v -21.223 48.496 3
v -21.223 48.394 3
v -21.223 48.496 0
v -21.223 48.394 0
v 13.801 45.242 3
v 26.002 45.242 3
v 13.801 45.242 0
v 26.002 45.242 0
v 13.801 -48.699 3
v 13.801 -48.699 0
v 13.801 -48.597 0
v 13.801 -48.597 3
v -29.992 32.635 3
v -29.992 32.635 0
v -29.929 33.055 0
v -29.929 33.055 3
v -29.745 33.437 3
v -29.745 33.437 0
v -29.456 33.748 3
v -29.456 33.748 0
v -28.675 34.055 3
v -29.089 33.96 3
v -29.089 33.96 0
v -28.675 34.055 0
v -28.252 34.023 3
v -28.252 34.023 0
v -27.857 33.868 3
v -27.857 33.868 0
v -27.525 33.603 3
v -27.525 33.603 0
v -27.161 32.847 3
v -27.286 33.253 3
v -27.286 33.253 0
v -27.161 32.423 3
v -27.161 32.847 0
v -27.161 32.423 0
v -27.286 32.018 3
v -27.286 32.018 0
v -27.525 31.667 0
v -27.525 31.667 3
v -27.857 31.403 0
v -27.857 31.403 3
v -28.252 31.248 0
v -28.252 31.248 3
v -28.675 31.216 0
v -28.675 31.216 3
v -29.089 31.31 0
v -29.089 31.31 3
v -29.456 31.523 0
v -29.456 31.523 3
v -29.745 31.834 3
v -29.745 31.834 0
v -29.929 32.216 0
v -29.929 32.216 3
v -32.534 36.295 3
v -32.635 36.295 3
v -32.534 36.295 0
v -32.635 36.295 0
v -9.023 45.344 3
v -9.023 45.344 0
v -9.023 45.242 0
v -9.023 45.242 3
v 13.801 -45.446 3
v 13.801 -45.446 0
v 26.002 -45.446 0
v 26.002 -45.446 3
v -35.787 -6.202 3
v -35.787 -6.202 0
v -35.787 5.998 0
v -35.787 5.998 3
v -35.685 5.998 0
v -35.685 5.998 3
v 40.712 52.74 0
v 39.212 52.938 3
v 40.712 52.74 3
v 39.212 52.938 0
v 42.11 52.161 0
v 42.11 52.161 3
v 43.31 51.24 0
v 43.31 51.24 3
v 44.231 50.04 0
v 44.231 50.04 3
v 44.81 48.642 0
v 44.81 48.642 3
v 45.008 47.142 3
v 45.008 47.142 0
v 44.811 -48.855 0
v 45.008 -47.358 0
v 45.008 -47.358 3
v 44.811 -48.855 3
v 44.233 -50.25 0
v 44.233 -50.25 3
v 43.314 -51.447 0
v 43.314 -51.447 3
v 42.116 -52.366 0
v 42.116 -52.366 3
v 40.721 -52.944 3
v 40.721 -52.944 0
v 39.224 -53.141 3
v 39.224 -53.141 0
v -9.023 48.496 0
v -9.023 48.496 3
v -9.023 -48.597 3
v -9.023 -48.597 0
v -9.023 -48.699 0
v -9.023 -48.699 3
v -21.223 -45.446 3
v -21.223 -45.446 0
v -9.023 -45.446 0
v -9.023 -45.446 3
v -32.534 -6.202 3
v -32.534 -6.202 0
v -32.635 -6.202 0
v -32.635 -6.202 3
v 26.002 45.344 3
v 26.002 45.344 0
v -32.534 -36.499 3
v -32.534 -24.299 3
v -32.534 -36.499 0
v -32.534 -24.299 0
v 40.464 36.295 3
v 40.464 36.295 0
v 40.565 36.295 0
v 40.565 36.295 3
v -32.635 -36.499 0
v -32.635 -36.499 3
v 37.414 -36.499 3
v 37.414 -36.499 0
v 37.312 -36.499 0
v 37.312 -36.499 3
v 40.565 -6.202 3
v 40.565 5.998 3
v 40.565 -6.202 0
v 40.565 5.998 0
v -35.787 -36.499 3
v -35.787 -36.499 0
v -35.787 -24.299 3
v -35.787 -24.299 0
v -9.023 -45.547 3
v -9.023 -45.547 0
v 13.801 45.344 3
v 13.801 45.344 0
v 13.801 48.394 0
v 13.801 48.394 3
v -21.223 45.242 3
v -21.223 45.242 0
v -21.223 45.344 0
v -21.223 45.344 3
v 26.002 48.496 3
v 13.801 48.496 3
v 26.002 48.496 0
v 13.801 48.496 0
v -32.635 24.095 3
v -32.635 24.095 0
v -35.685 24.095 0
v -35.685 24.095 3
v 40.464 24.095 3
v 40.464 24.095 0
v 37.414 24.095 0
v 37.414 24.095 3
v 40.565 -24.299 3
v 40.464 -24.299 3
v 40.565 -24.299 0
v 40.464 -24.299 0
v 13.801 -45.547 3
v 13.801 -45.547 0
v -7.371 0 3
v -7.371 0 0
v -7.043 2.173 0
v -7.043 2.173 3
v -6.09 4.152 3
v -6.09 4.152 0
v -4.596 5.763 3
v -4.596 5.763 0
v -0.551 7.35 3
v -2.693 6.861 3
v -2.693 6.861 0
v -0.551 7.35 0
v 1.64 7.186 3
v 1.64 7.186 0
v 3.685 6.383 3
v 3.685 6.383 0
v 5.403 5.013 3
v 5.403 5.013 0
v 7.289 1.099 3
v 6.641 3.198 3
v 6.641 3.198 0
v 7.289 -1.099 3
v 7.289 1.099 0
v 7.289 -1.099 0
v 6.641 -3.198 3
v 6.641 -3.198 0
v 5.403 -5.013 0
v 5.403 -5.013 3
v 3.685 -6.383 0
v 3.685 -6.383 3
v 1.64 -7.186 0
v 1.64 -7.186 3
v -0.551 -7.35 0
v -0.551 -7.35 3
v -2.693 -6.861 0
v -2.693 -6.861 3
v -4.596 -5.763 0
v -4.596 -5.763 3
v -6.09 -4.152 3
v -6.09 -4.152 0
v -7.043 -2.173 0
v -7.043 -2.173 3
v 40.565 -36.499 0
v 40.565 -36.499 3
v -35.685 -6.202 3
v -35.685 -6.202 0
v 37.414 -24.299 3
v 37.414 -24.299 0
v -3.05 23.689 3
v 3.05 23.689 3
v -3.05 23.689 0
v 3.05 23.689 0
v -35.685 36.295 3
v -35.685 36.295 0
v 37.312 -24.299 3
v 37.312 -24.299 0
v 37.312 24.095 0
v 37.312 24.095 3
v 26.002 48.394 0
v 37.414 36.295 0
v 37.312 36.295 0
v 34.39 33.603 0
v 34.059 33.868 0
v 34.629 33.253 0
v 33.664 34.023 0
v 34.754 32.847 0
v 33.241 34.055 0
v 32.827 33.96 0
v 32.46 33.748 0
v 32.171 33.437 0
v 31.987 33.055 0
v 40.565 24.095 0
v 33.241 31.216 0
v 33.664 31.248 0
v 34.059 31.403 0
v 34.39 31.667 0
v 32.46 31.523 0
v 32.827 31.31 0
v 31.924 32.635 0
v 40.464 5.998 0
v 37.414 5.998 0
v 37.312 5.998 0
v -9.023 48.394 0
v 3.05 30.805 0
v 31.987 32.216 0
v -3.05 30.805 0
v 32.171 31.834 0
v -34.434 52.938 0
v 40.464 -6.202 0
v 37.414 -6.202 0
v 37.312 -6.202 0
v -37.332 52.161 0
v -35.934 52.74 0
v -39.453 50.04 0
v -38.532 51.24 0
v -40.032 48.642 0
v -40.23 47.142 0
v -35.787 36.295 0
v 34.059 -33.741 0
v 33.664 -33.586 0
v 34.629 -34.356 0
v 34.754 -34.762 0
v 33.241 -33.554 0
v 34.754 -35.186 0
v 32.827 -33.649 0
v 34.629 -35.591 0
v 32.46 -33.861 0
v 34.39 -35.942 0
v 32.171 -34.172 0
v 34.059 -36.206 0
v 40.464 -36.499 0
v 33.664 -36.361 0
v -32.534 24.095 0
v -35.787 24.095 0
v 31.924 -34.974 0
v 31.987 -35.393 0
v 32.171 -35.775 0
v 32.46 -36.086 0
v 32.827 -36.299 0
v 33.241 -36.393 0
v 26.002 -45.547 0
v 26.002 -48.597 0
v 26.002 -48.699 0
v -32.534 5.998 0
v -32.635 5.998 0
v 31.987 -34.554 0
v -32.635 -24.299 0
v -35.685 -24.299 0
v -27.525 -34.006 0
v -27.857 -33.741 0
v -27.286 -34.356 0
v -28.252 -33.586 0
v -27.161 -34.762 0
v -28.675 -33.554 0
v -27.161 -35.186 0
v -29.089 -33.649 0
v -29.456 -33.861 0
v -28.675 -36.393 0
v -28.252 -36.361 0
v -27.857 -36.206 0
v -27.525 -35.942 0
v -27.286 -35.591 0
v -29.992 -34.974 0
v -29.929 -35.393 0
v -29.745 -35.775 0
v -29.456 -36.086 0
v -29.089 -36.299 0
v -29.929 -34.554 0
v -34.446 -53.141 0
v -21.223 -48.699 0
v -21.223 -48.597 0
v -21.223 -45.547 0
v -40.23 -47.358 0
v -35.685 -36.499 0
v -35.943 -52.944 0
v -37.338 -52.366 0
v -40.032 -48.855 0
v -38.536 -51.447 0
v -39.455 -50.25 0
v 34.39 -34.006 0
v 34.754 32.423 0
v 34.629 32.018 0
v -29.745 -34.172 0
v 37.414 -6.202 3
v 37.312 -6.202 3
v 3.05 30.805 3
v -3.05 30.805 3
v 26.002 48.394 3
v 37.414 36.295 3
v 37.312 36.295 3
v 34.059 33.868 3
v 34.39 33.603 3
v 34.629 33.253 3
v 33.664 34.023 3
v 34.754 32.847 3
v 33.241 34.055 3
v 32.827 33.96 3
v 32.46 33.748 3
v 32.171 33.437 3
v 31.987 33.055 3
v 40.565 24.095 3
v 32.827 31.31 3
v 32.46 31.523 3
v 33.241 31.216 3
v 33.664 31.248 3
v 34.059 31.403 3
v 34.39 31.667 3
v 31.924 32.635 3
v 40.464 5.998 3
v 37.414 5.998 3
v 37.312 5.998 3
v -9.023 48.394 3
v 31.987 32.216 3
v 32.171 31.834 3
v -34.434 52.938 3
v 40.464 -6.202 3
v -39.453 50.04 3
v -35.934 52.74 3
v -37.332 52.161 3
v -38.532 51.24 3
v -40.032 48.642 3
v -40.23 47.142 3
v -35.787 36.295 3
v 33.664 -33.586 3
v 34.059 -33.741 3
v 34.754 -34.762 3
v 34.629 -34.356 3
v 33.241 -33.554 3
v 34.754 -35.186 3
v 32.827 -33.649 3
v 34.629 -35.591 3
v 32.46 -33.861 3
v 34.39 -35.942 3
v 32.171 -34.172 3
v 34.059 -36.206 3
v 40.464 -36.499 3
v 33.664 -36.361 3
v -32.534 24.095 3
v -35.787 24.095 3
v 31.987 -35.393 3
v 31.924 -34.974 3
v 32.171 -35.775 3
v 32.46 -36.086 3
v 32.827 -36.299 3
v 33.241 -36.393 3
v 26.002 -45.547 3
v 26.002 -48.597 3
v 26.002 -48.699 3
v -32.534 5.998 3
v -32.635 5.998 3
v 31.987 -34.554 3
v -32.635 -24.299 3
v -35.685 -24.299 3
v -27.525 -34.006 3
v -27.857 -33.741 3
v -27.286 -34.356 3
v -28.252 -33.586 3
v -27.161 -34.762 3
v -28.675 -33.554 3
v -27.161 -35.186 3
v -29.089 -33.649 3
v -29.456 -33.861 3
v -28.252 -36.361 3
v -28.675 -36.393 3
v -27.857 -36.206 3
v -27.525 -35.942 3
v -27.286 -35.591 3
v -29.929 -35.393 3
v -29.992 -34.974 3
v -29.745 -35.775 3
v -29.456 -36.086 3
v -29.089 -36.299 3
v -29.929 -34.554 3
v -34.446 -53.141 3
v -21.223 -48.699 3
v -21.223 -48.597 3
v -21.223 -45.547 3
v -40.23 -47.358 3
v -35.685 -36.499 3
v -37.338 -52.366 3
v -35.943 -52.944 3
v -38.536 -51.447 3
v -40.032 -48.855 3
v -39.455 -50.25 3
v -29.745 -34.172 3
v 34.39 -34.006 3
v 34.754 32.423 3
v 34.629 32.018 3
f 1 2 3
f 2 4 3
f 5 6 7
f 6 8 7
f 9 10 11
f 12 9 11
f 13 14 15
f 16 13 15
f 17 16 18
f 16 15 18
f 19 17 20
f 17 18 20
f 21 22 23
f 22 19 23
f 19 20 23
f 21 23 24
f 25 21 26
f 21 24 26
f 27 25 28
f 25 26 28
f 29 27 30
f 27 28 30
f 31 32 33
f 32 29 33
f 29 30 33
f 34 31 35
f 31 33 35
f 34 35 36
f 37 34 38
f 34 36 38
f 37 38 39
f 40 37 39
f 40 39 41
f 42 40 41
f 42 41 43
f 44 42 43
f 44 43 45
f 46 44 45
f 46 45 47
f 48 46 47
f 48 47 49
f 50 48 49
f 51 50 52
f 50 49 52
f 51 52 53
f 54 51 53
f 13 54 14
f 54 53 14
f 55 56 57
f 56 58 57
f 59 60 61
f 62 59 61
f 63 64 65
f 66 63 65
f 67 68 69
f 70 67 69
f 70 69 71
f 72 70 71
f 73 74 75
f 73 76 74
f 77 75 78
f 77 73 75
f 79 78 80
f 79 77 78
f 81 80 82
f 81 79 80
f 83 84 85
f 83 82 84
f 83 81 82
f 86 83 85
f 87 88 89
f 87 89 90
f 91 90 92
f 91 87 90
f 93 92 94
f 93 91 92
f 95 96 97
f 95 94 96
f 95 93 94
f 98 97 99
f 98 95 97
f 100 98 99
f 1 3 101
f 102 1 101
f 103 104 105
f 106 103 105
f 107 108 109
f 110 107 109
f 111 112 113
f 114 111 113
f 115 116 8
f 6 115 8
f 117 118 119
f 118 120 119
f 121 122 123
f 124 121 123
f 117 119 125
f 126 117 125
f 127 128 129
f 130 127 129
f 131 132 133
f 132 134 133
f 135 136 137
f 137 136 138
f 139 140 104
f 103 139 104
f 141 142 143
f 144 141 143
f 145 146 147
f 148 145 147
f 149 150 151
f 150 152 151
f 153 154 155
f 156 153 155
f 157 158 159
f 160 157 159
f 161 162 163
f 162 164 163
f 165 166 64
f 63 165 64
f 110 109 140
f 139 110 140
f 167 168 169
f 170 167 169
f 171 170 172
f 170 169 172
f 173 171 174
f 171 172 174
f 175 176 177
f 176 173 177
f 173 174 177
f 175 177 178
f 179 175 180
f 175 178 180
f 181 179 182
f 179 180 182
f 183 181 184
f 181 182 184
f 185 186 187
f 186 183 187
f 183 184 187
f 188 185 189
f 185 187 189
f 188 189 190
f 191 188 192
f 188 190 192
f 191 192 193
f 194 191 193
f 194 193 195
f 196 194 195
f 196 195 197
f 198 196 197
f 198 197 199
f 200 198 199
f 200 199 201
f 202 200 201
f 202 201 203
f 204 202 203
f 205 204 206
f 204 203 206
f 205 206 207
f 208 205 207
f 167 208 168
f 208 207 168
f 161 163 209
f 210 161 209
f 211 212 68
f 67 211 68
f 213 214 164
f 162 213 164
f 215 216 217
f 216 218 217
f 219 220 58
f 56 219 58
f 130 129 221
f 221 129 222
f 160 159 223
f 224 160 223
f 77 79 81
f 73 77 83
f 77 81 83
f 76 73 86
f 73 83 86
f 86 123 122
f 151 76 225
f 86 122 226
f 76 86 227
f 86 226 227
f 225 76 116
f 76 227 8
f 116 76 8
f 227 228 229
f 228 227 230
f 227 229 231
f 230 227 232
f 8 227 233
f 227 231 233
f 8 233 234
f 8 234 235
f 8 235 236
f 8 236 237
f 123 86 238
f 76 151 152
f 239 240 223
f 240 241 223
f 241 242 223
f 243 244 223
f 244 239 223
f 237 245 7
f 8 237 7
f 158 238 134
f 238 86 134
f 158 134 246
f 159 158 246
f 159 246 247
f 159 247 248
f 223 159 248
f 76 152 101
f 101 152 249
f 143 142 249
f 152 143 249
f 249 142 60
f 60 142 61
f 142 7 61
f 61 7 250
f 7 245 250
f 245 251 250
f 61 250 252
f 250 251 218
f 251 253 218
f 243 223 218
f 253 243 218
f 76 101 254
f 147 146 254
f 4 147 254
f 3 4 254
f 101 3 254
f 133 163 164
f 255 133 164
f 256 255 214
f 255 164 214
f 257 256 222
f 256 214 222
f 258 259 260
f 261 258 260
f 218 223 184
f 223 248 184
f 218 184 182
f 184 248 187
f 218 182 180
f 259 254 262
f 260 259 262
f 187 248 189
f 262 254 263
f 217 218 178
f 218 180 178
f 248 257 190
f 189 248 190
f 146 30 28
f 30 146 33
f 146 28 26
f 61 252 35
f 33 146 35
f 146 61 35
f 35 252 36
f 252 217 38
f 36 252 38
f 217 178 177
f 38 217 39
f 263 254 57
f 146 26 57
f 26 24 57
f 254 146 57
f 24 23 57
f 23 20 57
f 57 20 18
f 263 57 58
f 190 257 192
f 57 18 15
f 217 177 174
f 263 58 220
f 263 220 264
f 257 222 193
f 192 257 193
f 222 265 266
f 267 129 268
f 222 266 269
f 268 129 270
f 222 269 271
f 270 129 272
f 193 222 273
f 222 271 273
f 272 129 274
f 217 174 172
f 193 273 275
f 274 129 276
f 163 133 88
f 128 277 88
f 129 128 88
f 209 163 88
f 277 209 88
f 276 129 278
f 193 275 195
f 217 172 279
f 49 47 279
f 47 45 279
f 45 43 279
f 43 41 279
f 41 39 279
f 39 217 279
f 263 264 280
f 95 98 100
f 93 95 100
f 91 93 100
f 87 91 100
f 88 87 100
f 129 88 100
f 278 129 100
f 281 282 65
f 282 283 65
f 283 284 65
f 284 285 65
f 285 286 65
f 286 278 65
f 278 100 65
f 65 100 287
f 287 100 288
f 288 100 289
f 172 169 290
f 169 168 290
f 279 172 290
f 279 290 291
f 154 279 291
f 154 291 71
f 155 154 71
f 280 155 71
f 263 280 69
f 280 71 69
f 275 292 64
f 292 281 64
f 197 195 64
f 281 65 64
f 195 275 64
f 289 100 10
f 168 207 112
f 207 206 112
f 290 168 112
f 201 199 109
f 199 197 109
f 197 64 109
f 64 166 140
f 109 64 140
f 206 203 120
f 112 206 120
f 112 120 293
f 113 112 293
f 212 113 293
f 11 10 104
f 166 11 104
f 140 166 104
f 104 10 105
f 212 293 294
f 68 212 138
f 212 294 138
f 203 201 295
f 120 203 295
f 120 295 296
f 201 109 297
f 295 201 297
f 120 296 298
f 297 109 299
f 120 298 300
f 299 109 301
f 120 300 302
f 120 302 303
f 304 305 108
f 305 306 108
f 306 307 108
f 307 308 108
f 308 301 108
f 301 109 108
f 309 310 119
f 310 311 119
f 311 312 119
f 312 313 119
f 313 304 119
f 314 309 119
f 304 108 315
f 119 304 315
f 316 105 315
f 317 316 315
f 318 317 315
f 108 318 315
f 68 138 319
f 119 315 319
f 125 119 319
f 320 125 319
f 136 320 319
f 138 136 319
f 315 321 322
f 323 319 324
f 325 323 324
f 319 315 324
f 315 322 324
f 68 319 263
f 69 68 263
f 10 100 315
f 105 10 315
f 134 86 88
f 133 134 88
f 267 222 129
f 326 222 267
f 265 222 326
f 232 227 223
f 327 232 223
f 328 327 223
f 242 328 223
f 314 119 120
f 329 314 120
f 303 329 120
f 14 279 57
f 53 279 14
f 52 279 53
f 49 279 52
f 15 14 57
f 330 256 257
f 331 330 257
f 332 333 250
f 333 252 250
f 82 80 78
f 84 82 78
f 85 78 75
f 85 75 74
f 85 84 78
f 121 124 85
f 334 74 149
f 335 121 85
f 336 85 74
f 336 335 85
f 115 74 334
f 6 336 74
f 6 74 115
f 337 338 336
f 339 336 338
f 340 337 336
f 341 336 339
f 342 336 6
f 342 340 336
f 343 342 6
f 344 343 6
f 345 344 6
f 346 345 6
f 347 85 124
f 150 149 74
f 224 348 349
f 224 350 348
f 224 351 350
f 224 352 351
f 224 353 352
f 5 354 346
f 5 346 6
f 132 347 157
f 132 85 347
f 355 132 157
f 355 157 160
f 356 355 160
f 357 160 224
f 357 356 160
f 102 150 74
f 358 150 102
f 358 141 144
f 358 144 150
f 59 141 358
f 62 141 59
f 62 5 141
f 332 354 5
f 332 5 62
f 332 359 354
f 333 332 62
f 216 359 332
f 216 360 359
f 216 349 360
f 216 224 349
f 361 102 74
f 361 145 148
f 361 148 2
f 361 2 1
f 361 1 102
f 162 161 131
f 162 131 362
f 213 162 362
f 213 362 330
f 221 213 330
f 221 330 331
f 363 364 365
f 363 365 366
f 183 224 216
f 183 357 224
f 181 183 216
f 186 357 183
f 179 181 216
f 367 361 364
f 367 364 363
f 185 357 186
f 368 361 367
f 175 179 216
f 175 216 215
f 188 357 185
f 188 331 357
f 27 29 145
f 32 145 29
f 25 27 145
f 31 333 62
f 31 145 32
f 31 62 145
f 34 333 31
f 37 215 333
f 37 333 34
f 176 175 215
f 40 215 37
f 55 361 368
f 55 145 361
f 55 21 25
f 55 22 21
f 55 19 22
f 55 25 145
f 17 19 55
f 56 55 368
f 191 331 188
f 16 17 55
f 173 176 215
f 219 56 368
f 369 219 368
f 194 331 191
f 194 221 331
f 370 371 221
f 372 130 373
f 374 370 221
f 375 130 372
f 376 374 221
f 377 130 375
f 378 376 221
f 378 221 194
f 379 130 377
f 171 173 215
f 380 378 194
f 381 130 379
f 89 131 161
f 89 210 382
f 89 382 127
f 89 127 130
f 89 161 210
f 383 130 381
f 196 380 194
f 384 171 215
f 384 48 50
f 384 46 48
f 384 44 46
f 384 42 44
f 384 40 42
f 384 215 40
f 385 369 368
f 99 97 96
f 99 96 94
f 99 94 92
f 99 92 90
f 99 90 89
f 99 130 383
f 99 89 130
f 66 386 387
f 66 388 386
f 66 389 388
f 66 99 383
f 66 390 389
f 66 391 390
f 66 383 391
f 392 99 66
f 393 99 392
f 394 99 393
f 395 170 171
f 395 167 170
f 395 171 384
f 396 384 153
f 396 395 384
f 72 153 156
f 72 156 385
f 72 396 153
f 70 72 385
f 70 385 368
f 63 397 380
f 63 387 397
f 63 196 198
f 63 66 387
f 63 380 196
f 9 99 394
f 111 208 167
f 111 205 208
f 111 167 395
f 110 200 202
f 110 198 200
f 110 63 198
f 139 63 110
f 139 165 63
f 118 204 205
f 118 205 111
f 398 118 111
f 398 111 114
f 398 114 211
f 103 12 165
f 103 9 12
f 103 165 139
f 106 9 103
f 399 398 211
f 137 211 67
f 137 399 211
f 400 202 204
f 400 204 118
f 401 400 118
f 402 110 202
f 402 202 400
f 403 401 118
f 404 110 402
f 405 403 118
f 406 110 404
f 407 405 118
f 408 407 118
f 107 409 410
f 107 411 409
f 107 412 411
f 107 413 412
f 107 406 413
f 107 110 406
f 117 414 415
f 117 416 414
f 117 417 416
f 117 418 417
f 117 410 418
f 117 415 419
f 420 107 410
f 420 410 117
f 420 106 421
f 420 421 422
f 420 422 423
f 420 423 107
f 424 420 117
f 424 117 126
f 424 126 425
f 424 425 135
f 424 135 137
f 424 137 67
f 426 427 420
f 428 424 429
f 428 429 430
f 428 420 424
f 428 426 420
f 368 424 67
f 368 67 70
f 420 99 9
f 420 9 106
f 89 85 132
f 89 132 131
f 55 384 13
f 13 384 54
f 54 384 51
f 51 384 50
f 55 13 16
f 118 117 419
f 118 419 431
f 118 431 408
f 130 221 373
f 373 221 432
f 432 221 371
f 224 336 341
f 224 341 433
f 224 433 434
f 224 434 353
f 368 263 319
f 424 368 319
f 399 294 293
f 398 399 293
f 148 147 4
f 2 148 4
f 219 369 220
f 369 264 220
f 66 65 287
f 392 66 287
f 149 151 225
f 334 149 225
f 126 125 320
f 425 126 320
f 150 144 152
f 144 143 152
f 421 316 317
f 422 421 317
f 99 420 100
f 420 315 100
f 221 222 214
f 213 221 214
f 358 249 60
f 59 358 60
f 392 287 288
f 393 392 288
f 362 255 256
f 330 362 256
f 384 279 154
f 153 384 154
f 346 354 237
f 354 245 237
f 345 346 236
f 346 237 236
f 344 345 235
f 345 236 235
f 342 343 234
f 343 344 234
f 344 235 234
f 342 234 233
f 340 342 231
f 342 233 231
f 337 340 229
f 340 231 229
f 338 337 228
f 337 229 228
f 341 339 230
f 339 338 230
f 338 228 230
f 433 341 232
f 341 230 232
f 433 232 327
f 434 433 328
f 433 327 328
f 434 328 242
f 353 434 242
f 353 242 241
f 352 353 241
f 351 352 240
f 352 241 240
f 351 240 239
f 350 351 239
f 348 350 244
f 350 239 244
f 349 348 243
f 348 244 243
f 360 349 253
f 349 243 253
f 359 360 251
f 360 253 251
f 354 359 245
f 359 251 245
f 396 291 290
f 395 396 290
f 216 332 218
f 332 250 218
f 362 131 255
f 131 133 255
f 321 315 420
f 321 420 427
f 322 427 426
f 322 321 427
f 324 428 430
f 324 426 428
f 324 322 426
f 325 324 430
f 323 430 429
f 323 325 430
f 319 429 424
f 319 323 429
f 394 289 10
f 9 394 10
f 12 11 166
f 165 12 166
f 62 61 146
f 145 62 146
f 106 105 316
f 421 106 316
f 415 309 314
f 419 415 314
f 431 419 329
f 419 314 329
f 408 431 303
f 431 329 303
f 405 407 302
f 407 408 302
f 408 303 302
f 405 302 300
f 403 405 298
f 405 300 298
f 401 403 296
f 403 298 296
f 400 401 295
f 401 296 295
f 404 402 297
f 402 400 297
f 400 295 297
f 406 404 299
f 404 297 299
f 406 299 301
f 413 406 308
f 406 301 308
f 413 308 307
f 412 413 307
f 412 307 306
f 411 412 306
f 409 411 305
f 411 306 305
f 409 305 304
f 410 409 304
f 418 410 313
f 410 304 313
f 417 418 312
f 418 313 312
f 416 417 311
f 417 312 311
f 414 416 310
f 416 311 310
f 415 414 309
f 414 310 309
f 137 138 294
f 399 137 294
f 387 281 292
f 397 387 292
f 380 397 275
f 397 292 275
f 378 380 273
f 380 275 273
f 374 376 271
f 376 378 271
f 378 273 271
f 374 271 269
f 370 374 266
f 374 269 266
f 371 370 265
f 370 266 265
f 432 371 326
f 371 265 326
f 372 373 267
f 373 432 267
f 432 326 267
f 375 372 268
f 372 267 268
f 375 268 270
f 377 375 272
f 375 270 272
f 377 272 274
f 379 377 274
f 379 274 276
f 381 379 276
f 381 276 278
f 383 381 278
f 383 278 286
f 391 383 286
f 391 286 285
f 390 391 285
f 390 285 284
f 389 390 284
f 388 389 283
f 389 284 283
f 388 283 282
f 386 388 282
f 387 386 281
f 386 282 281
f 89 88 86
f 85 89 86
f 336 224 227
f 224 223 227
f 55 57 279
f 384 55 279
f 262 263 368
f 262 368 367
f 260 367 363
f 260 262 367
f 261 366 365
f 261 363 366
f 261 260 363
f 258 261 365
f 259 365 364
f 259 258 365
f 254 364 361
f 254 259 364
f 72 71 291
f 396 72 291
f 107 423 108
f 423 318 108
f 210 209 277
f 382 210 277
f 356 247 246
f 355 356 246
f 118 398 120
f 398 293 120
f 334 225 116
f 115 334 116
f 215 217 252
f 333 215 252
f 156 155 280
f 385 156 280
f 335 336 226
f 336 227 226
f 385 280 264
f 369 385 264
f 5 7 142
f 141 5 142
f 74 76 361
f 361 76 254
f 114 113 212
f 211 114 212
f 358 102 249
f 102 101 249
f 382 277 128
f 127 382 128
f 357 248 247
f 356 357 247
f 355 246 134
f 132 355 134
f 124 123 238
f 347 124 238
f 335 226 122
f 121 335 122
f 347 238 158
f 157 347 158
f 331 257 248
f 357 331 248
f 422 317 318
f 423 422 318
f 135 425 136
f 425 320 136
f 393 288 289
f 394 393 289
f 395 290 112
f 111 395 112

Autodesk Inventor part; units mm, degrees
ref_plane "YZ Plane" through (0, 0, 0) normal (1, 0, 0) x (0, 1, 0)
ref_plane "XZ Plane" through (0, 0, 0) normal (0, 1, 0) x (-1, 0, 0)
ref_plane "XY Plane" through (0, 0, 0) normal (0, 0, 1) x (1, 0, 0)
sketch "Boceto1" plane through (0, 0, 0) normal (0, 0, 1) x (-1, 0, 0)
  line L0 (-40.5654, -5.9984) -> (-40.5654, 6.2017)
  line L1 (-40.5654, 6.2017) -> (-40.4637, 6.2017)
  line L2 (-40.4637, 6.2017) -> (-37.4137, 6.2017)
  line L3 (-37.4137, 6.2017) -> (-37.312, 6.2017)
  line L4 (-37.312, 6.2017) -> (-37.312, -5.9984)
  line L5 (-37.312, -5.9984) -> (-37.4137, -5.9984)
  line L6 (-37.4137, -5.9984) -> (-40.4637, -5.9984)
  line L7 (-40.4637, -5.9984) -> (-40.5654, -5.9984)
  line L8 (35.787, -5.9984) -> (35.6854, -5.9984)
  line L9 (35.6854, -5.9984) -> (32.6353, -5.9984)
  line L10 (32.6353, -5.9984) -> (32.5337, -5.9984)
  line L11 (32.5337, -5.9984) -> (32.5337, 6.2017)
  line L12 (32.5337, 6.2017) -> (32.6353, 6.2017)
  line L13 (32.6353, 6.2017) -> (35.6854, 6.2017)
  line L14 (35.6854, 6.2017) -> (35.787, 6.2017)
  line L15 (35.787, 6.2017) -> (35.787, -5.9984)
  line L16 (35.6854, 36.4987) -> (35.787, 36.4987)
  line L17 (35.787, 36.4987) -> (35.787, 24.2986)
  line L18 (35.787, 24.2986) -> (35.6854, 24.2986)
  line L19 (35.6854, 24.2986) -> (32.6353, 24.2986)
  line L20 (32.6353, 24.2986) -> (32.5337, 24.2986)
  line L21 (32.5337, 24.2986) -> (32.5337, 36.4987)
  line L22 (32.5337, 36.4987) -> (32.6353, 36.4987)
  line L23 (32.6353, 36.4987) -> (35.6854, 36.4987)
  line L24 (-26.0015, -48.4955) -> (-26.0015, -48.3938)
  line L25 (-26.0015, -48.3938) -> (-26.0015, -45.3438)
  line L26 (-26.0015, -45.3438) -> (-26.0015, -45.2421)
  line L27 (-26.0015, -45.2421) -> (-13.8014, -45.2421)
  line L28 (-13.8014, -45.2421) -> (-13.8014, -45.3438)
  line L29 (-13.8014, -45.3438) -> (-13.8014, -48.3938)
  line L30 (-13.8014, -48.3938) -> (-13.8014, -48.4955)
  line L31 (-13.8014, -48.4955) -> (-26.0015, -48.4955)
  line L32 (9.023, 45.4455) -> (9.023, 45.5471)
  line L33 (9.023, 45.5471) -> (9.023, 48.5971)
  line L34 (9.023, 48.5971) -> (9.023, 48.6988)
  line L35 (9.023, 48.6988) -> (21.2231, 48.6988)
  line L36 (21.2231, 48.6988) -> (21.2231, 48.5971)
  line L37 (21.2231, 48.5971) -> (21.2231, 45.5471)
  line L38 (21.2231, 45.5471) -> (21.2231, 45.4455)
  line L39 (21.2231, 45.4455) -> (9.023, 45.4455)
  line L40 (-26.0015, 45.4455) -> (-26.0015, 45.5471)
  line L41 (-26.0015, 45.5471) -> (-26.0015, 48.5971)
  line L42 (-26.0015, 48.5971) -> (-26.0015, 48.6988)
  line L43 (-26.0015, 48.6988) -> (-13.8014, 48.6988)
  line L44 (-13.8014, 48.6988) -> (-13.8014, 48.5971)
  line L45 (-13.8014, 48.5971) -> (-13.8014, 45.5471)
  line L46 (-13.8014, 45.5471) -> (-13.8014, 45.4455)
  line L47 (-13.8014, 45.4455) -> (-26.0015, 45.4455)
  line L48 (32.6353, -24.0952) -> (35.6854, -24.0952)
  line L49 (35.6854, -24.0952) -> (35.787, -24.0952)
  line L50 (35.787, -24.0952) -> (35.787, -36.2954)
  line L51 (35.787, -36.2954) -> (35.6854, -36.2954)
  line L52 (35.6854, -36.2954) -> (32.6353, -36.2954)
  line L53 (32.6353, -36.2954) -> (32.5337, -36.2954)
  line L54 (32.5337, -36.2954) -> (32.5337, -24.0952)
  line L55 (32.5337, -24.0952) -> (32.6353, -24.0952)
  line L56 (9.023, -48.4955) -> (9.023, -48.3938)
  line L57 (9.023, -48.3938) -> (9.023, -45.3438)
  line L58 (9.023, -45.3438) -> (9.023, -45.2421)
  line L59 (9.023, -45.2421) -> (21.2231, -45.2421)
  line L60 (21.2231, -45.2421) -> (21.2231, -45.3438)
  line L61 (21.2231, -45.3438) -> (21.2231, -48.3938)
  line L62 (21.2231, -48.3938) -> (21.2231, -48.4955)
  line L63 (21.2231, -48.4955) -> (9.023, -48.4955)
  line L64 (-37.4137, -36.2954) -> (-40.4637, -36.2954)
  line L65 (-40.4637, -36.2954) -> (-40.5654, -36.2954)
  line L66 (-40.5654, -36.2954) -> (-40.5654, -24.0952)
  line L67 (-40.5654, -24.0952) -> (-40.4637, -24.0952)
  line L68 (-40.4637, -24.0952) -> (-37.4137, -24.0952)
  line L69 (-37.4137, -24.0952) -> (-37.312, -24.0952)
  line L70 (-37.312, -24.0952) -> (-37.312, -36.2954)
  line L71 (-37.312, -36.2954) -> (-37.4137, -36.2954)
  line L72 (-37.312, 36.4987) -> (-37.312, 24.2986)
  line L73 (-37.312, 24.2986) -> (-37.4137, 24.2986)
  line L74 (-37.4137, 24.2986) -> (-40.4637, 24.2986)
  line L75 (-40.4637, 24.2986) -> (-40.5654, 24.2986)
  line L76 (-40.5654, 24.2986) -> (-40.5654, 36.4987)
  line L77 (-40.5654, 36.4987) -> (-40.4637, 36.4987)
  line L78 (-40.4637, 36.4987) -> (-37.4137, 36.4987)
  line L79 (-37.4137, 36.4987) -> (-37.312, 36.4987)
  line L80 (-3.05, -23.6886) -> (3.05, -23.6886)
  line L81 (3.05, -23.6886) -> (3.05, -30.8053)
  line L82 (3.05, -30.8053) -> (-3.05, -30.8053)
  line L83 (-3.05, -30.8053) -> (-3.05, -23.6886)
  circle A0 centre (-33.347, 34.9737) radius 1.4233
  circle A1 centre (28.5686, 34.9737) radius 1.4233
  circle A2 centre (0, 0) radius 7.3709
  circle A3 centre (-33.347, -32.6353) radius 1.4233
  circle A4 centre (28.5686, -32.6353) radius 1.4233
  line L84 (21.2231, 48.6988) -> (9.023, 48.6988)
  line L85 (9.023, 48.6988) -> (9.023, 45.4455)
  line L86 (9.023, 45.4455) -> (21.2231, 45.4455)
  line L87 (21.2231, 45.4455) -> (21.2231, 48.6988)
  line L88 (35.787, 36.4987) -> (32.5337, 36.4987)
  line L89 (32.5337, 36.4987) -> (32.5337, 24.2986)
  line L90 (32.5337, 24.2986) -> (35.787, 24.2986)
  line L91 (35.787, 24.2986) -> (35.787, 36.4987)
  line L92 (35.787, 6.2017) -> (32.5337, 6.2017)
  line L93 (32.5337, 6.2017) -> (32.5337, -5.9984)
  line L94 (32.5337, -5.9984) -> (35.787, -5.9984)
  line L95 (35.787, -5.9984) -> (35.787, 6.2017)
  line L96 (35.787, -24.0952) -> (32.5337, -24.0952)
  line L97 (32.5337, -24.0952) -> (32.5337, -36.2954)
  line L98 (32.5337, -36.2954) -> (35.787, -36.2954)
  line L99 (35.787, -36.2954) -> (35.787, -24.0952)
  line L100 (21.2231, -45.2421) -> (9.023, -45.2421)
  line L101 (9.023, -45.2421) -> (9.023, -48.4955)
  line L102 (9.023, -48.4955) -> (21.2231, -48.4955)
  line L103 (21.2231, -48.4955) -> (21.2231, -45.2421)
  line L104 (-13.8014, -45.2421) -> (-26.0015, -45.2421)
  line L105 (-26.0015, -45.2421) -> (-26.0015, -48.4955)
  line L106 (-26.0015, -48.4955) -> (-13.8014, -48.4955)
  line L107 (-13.8014, -48.4955) -> (-13.8014, -45.2421)
  line L108 (-37.312, -36.2954) -> (-40.5654, -36.2954)
  line L109 (-40.5654, -36.2954) -> (-40.5654, -24.0952)
  line L110 (-40.5654, -24.0952) -> (-37.312, -24.0952)
  line L111 (-37.312, -24.0952) -> (-37.312, -36.2954)
  line L112 (-37.312, -5.9984) -> (-40.5654, -5.9984)
  line L113 (-40.5654, -5.9984) -> (-40.5654, 6.2017)
  line L114 (-40.5654, 6.2017) -> (-37.312, 6.2017)
  line L115 (-37.312, 6.2017) -> (-37.312, -5.9984)
  line L116 (-37.312, 24.2986) -> (-40.5654, 24.2986)
  line L117 (-40.5654, 24.2986) -> (-40.5654, 36.4987)
  line L118 (-40.5654, 36.4987) -> (-37.312, 36.4987)
  line L119 (-37.312, 36.4987) -> (-37.312, 24.2986)
  line L120 (-26.0015, 48.6988) -> (-13.8014, 48.6988)
  line L121 (-13.8014, 48.6988) -> (-13.8014, 45.4455)
  line L122 (-13.8014, 45.4455) -> (-26.0015, 45.4455)
  line L123 (-26.0015, 45.4455) -> (-26.0015, 48.6988)
  line L124 (3.05, -23.6886) -> (-3.05, -23.6886)
  line L125 (-3.05, -23.6886) -> (-3.05, -30.8053)
  line L126 (-3.05, -30.8053) -> (3.05, -30.8053)
  line L127 (3.05, -30.8053) -> (3.05, -23.6886)
  arc A5 (40.2295, 47.3577) -> (34.4459, 53.1413) centre (34.4459, 47.3577) ccw
  line L128 (34.4459, 53.1413) -> (-39.2245, 53.1413)
  arc A6 (-39.2245, 53.1413) -> (-45.0078, 47.3579) centre (-39.2245, 47.3579) ccw
  line L129 (-45.0078, 47.3579) -> (-45.0078, -47.1423)
  arc A7 (-45.0078, -47.1423) -> (-39.2123, -52.9379) centre (-39.2123, -47.1423) ccw
  line L130 (-39.2123, -52.9379) -> (34.4339, -52.9379)
  arc A8 (34.4339, -52.9379) -> (40.2295, -47.1423) centre (34.4339, -47.1423) ccw
  line L131 (40.2295, -47.1423) -> (40.2295, 47.3577)
extrude "Extrusión1" add sketch "Boceto1" along normal blind 3
sketch "Boceto2" plane through (0, 0, 3) normal (0, 0, 1) x (1, 0, 0)
  line L0 (-34.4459, -53.1413) -> (39.2245, -53.1413) projected
  line L1 (39.2123, 52.9379) -> (-34.4339, 52.9379) projected
  line L2 (-40.2295, 47.1423) -> (-40.2295, -47.3577) projected
  line L3 (45.0078, -47.3579) -> (45.0078, 47.1423) projected
  point P0 (0, 0)
  dimension "d5" = 106.0792
  dimension "d6" = 85.2373
properties part number "tapa2"
